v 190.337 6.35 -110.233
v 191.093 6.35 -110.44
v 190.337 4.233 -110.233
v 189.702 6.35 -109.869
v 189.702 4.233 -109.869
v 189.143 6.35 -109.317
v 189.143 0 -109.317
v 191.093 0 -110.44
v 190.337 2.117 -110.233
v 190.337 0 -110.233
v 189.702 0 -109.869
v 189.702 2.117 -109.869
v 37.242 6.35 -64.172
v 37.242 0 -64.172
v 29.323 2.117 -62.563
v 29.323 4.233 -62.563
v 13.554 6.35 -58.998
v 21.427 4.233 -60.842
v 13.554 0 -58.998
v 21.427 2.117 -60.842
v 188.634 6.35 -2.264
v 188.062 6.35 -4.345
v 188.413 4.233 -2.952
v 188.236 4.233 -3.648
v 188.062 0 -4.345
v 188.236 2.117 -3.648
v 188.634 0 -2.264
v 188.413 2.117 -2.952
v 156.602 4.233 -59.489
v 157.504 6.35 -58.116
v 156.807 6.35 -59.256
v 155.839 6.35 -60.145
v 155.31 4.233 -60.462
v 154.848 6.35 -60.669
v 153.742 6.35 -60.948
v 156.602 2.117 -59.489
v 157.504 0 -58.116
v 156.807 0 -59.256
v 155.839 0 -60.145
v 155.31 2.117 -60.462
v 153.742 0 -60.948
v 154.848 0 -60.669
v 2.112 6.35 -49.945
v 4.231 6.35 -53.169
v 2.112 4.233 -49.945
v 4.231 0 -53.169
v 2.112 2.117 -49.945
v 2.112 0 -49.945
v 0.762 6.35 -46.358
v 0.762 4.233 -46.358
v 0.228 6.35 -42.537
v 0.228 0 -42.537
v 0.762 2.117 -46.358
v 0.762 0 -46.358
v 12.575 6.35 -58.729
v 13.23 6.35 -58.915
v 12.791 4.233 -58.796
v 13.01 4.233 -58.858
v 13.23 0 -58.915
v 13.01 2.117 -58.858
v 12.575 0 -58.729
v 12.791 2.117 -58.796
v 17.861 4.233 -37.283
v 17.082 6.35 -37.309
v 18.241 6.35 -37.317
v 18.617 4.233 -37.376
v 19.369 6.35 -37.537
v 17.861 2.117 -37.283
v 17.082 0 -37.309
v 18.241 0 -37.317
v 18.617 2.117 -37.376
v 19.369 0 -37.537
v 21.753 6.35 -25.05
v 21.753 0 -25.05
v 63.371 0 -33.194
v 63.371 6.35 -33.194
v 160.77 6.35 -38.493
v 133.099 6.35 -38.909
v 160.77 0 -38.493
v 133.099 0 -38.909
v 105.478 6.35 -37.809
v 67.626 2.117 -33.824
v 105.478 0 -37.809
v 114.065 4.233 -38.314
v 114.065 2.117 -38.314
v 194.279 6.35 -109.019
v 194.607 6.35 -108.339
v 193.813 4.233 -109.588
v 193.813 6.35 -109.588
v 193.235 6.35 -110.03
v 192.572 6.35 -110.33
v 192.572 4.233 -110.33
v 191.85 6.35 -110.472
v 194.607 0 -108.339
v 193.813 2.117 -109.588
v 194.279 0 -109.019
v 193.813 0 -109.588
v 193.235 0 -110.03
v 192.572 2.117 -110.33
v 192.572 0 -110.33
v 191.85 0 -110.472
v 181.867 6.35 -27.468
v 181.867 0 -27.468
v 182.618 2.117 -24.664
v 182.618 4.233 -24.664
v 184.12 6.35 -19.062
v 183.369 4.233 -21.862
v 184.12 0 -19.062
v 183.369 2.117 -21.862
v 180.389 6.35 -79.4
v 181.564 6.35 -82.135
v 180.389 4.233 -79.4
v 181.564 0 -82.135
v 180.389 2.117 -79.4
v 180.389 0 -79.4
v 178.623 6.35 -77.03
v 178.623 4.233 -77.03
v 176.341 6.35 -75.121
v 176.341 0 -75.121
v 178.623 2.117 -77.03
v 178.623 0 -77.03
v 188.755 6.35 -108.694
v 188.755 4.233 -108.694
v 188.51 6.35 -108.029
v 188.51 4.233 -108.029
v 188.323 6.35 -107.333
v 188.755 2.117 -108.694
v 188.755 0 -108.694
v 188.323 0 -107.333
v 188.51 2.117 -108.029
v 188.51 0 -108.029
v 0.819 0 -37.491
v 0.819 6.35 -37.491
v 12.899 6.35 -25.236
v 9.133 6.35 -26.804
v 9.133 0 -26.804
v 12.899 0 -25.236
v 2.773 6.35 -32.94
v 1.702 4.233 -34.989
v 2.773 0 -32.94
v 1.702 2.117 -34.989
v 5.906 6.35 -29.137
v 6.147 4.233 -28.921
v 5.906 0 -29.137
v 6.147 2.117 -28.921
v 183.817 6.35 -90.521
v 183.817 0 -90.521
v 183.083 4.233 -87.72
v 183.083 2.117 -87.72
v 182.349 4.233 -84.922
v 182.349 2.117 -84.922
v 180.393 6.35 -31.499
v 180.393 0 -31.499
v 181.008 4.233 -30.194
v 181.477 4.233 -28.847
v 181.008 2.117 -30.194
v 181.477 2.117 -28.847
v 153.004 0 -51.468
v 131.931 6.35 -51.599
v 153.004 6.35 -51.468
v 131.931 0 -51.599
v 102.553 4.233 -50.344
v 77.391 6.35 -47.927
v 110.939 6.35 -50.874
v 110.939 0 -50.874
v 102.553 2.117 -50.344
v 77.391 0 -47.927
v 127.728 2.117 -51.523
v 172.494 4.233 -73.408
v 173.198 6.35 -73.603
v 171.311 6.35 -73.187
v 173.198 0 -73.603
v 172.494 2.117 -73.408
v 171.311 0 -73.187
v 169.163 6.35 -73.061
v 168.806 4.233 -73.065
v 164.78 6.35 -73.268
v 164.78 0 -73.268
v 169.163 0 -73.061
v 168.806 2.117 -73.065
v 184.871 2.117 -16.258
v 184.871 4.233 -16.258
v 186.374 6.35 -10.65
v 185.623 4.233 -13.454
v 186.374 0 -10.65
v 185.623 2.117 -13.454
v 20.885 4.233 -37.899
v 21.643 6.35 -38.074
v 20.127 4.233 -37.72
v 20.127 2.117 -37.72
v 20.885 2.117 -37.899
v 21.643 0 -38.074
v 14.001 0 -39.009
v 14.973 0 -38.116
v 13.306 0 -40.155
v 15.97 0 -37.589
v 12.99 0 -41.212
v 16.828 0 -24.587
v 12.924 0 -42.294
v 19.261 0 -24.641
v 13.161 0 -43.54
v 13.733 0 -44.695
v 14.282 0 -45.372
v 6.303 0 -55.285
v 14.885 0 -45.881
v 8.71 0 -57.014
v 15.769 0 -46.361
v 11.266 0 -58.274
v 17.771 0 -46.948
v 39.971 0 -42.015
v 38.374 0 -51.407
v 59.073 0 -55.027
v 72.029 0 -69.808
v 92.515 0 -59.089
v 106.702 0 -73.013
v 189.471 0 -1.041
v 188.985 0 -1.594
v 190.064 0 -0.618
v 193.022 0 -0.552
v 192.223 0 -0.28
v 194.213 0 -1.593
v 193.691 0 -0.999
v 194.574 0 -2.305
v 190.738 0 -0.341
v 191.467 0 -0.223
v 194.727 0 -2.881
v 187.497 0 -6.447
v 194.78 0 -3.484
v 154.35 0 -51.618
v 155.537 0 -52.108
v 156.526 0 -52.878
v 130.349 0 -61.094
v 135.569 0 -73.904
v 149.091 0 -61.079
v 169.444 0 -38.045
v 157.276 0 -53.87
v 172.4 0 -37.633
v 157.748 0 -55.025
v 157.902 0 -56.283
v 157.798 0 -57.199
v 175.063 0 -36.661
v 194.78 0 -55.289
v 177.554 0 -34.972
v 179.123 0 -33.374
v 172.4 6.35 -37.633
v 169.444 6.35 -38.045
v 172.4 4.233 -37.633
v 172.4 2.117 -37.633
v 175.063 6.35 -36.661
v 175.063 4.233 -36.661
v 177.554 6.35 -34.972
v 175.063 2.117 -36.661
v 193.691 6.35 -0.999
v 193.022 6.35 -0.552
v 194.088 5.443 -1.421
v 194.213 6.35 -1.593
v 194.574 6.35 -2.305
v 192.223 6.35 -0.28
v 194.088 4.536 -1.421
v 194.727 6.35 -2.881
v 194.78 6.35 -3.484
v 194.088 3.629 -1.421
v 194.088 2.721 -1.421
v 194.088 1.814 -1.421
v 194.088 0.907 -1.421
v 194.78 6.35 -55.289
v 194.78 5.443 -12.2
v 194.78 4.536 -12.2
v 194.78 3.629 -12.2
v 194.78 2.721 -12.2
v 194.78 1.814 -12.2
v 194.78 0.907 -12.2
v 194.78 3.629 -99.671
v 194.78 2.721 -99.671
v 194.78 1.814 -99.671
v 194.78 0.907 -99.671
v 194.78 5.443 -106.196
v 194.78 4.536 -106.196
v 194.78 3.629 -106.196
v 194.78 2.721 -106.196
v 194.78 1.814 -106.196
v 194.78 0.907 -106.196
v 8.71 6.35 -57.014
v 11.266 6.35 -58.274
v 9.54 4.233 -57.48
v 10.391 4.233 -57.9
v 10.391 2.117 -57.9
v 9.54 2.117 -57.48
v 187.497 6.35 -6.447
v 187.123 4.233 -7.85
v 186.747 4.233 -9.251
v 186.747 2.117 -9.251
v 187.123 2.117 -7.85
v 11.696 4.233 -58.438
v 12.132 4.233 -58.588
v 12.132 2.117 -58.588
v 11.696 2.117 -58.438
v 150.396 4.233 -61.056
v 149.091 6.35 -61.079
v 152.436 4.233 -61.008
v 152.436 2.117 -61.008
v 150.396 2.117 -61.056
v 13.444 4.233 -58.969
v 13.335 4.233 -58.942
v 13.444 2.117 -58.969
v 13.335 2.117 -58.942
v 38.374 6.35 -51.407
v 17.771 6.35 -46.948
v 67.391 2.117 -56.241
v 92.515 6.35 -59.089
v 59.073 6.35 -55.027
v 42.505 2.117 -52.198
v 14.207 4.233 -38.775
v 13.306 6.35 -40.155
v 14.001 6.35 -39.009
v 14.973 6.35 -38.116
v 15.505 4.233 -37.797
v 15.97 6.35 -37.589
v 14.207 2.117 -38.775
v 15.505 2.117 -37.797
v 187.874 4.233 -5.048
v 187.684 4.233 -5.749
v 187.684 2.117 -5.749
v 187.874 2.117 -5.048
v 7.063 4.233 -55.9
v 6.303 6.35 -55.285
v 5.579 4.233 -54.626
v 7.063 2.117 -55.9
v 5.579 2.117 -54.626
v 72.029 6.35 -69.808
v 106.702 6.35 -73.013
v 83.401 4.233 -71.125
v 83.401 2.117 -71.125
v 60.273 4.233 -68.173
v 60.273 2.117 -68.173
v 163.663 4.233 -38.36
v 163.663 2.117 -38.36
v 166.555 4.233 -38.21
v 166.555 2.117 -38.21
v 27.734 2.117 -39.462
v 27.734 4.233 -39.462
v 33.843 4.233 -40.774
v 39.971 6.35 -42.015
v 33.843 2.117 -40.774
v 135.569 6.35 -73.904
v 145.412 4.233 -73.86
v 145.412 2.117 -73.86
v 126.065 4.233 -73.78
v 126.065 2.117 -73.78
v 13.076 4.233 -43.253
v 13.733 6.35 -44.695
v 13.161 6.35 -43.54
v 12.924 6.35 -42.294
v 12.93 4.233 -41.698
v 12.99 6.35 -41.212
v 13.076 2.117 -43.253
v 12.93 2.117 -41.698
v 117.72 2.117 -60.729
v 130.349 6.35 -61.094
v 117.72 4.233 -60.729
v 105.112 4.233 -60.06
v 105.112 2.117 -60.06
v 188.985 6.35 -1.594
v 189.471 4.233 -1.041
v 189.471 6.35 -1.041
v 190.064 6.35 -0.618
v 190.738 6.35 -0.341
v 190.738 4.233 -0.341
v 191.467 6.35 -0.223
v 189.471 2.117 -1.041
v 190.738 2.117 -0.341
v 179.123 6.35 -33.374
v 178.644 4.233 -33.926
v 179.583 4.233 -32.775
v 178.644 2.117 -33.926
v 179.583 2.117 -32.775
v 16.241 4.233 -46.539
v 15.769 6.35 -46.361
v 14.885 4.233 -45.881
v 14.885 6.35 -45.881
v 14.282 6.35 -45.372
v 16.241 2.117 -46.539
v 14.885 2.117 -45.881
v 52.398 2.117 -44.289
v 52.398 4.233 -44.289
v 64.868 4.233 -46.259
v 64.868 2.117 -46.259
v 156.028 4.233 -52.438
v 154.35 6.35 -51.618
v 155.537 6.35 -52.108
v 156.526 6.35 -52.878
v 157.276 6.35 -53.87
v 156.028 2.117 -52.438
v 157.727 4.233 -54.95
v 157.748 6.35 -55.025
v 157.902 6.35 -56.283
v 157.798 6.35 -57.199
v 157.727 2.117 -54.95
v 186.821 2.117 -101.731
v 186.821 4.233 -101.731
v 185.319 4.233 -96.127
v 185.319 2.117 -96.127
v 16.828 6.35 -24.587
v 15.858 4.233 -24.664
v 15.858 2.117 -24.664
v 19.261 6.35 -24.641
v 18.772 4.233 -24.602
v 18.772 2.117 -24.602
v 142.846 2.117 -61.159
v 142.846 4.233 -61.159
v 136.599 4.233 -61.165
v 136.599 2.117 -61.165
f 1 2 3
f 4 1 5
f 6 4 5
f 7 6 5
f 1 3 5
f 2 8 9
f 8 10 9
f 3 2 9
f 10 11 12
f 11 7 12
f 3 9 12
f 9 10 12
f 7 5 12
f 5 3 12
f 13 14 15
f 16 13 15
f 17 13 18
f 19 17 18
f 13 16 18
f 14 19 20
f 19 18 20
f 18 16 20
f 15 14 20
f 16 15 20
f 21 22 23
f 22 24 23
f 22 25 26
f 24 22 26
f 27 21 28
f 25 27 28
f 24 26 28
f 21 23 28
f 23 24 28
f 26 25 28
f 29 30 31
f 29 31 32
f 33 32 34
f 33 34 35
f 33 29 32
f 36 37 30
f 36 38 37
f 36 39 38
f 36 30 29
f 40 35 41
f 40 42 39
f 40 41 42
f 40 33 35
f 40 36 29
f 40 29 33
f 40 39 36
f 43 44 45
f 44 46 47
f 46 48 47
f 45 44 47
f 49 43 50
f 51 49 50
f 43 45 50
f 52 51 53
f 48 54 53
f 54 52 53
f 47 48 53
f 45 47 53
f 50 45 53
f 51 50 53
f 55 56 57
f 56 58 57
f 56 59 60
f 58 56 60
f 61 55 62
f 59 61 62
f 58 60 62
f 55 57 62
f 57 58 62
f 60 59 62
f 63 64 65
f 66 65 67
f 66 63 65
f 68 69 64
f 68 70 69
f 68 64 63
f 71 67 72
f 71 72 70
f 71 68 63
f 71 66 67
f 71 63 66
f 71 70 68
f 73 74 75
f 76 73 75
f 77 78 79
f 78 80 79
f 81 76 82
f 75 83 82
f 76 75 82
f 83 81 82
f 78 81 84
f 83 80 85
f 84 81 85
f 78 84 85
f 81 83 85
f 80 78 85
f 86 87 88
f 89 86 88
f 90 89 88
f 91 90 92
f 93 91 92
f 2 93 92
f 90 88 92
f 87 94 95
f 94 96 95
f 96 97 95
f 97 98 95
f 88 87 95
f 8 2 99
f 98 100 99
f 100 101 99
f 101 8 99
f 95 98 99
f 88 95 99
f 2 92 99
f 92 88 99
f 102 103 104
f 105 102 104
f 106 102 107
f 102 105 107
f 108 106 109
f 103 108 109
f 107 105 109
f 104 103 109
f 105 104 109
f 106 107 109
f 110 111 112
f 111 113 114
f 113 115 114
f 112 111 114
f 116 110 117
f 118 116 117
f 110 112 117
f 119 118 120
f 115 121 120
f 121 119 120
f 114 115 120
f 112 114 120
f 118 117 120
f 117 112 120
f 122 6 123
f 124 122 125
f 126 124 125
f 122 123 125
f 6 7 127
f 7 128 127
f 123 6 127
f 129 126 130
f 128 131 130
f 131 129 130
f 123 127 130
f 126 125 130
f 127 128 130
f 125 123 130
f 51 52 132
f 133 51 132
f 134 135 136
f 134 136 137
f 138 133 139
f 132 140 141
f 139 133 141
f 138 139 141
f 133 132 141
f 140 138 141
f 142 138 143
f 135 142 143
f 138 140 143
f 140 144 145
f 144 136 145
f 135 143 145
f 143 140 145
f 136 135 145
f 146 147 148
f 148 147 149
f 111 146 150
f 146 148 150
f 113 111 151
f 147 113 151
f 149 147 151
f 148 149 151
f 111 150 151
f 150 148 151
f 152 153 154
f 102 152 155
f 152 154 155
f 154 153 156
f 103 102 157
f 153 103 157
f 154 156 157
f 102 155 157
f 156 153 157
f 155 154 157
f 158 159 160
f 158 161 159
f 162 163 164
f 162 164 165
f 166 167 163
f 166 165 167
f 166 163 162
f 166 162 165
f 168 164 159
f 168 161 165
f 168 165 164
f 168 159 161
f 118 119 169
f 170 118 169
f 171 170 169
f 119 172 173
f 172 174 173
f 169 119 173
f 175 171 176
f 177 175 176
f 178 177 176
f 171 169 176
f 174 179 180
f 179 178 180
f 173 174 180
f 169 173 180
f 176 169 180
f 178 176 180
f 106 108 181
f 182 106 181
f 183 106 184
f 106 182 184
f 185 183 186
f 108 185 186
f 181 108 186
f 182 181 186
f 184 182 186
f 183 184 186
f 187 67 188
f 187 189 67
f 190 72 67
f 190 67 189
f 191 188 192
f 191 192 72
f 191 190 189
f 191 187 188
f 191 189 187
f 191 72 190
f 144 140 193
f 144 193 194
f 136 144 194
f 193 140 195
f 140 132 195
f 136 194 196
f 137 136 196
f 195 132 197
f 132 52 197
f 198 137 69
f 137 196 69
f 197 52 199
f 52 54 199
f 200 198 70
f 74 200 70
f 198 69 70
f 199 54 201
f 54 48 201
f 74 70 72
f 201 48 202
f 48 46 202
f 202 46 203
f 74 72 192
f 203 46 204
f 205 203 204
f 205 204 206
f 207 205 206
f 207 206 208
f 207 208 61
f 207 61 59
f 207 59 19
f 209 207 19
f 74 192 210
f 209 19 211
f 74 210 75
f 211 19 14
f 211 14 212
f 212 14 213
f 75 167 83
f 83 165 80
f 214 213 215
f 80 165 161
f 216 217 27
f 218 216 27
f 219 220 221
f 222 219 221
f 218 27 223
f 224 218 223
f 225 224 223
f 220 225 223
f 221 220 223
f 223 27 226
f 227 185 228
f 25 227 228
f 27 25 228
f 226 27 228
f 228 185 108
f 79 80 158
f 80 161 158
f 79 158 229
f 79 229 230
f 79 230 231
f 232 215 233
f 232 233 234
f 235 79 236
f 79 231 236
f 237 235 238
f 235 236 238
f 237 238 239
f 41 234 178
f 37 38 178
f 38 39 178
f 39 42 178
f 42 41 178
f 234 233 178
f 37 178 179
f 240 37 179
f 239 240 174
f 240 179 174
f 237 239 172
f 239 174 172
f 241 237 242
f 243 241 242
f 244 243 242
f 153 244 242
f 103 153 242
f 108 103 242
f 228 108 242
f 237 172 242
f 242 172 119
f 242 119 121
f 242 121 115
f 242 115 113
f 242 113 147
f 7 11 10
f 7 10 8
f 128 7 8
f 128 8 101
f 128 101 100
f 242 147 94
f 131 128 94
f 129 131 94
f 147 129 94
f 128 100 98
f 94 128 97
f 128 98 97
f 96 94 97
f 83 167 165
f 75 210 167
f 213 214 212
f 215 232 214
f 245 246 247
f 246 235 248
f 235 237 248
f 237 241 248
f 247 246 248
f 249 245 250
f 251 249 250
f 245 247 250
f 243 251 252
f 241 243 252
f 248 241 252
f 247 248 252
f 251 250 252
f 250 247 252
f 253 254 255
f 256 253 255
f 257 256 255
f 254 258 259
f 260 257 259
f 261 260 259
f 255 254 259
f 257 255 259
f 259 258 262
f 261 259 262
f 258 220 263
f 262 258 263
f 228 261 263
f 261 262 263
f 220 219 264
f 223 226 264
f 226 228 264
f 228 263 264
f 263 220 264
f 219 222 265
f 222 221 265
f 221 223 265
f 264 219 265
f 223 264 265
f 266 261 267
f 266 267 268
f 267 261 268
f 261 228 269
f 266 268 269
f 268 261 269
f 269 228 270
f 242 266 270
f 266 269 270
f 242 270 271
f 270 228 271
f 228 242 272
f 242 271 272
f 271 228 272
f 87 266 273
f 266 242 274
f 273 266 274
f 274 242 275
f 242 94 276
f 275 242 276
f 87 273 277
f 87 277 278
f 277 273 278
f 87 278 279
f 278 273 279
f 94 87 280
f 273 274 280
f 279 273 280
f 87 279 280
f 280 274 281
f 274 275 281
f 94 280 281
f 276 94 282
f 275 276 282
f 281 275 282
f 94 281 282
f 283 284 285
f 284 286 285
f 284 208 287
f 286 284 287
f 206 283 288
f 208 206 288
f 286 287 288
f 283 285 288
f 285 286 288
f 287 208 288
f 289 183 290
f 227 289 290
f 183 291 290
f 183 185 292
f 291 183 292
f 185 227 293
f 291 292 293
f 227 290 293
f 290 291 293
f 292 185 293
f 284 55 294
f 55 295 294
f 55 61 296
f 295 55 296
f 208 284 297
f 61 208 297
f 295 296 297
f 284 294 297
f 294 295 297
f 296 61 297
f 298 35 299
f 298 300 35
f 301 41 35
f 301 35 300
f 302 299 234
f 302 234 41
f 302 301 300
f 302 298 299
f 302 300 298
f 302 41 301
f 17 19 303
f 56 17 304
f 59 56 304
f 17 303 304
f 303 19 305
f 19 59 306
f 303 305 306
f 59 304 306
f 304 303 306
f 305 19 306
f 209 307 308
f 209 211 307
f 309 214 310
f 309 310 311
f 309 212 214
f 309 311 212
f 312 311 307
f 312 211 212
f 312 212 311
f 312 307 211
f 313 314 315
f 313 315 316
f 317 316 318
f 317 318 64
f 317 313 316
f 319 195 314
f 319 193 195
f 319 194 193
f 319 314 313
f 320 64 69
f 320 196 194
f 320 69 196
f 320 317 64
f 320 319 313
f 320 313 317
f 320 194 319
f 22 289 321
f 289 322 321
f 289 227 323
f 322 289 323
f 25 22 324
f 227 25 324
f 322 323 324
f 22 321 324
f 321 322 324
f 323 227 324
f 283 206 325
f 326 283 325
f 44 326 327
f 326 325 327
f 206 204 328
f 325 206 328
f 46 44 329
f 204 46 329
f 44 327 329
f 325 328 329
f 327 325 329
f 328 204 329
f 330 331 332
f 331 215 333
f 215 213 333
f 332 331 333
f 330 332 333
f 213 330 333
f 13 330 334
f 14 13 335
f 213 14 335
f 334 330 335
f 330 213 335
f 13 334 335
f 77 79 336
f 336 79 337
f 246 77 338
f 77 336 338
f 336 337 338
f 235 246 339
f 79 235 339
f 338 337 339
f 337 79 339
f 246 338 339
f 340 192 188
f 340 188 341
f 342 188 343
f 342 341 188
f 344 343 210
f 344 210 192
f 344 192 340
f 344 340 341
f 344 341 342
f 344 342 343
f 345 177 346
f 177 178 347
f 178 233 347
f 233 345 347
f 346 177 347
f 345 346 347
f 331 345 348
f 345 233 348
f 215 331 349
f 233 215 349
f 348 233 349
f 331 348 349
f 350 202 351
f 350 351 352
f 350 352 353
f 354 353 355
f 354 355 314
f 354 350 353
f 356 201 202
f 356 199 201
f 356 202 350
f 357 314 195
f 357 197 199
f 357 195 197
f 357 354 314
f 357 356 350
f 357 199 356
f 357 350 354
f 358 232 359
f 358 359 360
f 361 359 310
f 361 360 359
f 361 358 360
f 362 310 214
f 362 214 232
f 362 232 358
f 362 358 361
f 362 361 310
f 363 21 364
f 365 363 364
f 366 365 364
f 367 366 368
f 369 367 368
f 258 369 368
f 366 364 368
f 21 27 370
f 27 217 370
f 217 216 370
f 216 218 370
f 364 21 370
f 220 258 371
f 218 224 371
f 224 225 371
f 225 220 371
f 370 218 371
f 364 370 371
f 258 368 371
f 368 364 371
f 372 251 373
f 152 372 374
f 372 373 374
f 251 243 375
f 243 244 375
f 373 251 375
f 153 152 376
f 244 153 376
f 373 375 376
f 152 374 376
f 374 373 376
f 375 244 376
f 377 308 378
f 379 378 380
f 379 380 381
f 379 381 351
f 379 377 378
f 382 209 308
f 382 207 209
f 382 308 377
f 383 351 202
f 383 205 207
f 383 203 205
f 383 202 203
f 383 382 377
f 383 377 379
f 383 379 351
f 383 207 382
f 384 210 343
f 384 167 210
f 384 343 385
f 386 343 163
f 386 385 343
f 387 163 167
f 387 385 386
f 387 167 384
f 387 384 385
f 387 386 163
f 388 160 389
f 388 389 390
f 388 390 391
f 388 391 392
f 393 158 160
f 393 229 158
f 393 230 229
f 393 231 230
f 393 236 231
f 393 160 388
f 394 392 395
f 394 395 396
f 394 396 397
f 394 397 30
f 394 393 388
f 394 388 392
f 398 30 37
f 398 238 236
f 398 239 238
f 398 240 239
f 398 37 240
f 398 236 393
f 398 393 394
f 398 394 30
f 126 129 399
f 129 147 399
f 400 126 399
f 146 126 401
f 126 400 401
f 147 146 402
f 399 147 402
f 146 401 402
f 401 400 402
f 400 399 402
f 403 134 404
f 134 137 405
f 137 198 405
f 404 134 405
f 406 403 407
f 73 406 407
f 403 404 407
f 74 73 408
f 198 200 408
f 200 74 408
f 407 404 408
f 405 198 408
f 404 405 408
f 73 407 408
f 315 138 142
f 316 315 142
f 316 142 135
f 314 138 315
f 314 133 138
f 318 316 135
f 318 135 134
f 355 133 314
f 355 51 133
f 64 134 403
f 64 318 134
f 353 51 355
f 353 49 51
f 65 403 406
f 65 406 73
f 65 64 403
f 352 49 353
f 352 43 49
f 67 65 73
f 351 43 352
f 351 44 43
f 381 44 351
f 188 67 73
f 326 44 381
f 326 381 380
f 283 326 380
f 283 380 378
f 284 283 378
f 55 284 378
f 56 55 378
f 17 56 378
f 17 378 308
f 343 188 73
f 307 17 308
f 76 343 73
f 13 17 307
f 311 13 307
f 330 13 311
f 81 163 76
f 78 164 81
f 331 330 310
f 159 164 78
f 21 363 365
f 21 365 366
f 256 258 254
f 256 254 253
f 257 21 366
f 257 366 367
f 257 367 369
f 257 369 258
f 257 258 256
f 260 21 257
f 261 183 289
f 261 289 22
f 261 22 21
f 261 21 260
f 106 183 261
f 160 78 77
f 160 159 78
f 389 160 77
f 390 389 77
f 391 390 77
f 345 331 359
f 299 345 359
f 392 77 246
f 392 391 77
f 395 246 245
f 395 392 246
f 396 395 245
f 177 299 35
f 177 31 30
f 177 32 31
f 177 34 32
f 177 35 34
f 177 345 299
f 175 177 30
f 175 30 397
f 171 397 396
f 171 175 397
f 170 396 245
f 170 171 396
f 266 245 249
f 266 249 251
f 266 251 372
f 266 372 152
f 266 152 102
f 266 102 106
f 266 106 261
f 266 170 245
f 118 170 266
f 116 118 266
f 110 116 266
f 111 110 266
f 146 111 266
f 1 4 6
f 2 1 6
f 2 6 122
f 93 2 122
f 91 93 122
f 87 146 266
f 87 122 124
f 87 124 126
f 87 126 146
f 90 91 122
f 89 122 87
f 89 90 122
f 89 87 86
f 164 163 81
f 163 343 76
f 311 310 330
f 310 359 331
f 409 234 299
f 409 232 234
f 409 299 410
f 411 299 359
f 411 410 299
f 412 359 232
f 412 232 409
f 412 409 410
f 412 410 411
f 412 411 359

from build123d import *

# Parameters (mm, degrees)
BOSS_EXTRUDE1_DEPTH = 6.35


with BuildPart() as part:
    # Imported Profile → Boss-Extrude1 (new body)
    with BuildSketch(Plane(origin=(0, 0, 0), x_dir=(1, 0, 0), z_dir=(0, 1, 0))):
        with BuildLine():
            add(Edge.make_bspline(
                [(12.8991106, 25.2359922), (15.9171132, 24.409273), (18.70075, 24.3472716), (21.7531188, 25.0501404)],
                knots=[0, 0, 0, 0, 1, 1, 1, 1], degree=3))
            add(Edge.make_bspline(
                [(21.7531188, 25.0501404), (67.2421566, 35.9573322), (114.0334524, 40.4772876), (160.7696048, 38.492938)],
                knots=[0, 0, 0, 0, 1, 1, 1, 1], degree=3))
            add(Edge.make_bspline(
                [(160.7696048, 38.492938), (163.6634776, 38.3689352), (166.5573758, 38.2174242), (169.4443652, 38.0449328)],
                knots=[0, 0, 0, 0, 1, 1, 1, 1], degree=3))
            add(Edge.make_bspline(
                [(169.4443652, 38.0449328), (172.5862944, 37.8589286), (175.108108, 37.0734336), (177.5541026, 34.9719392)],
                knots=[0, 0, 0, 0, 1, 1, 1, 1], degree=3))
            add(Edge.make_bspline(
                [(177.5541026, 34.9719392), (178.725449, 33.9728302), (179.6418556, 32.842835), (180.3928574, 31.4992766)],
                knots=[0, 0, 0, 0, 1, 1, 1, 1], degree=3))
            add(Edge.make_bspline(
                [(180.3928574, 31.4992766), (181.1025588, 30.2176688), (181.4952936, 28.8603182), (181.8673782, 27.4684744)],
                knots=[0, 0, 0, 0, 1, 1, 1, 1], degree=3))
            add(Edge.make_bspline(
                [(181.8673782, 27.4684744), (182.6184054, 24.6641874), (183.3694326, 21.859875), (184.1204598, 19.0624714)],
                knots=[0, 0, 0, 0, 1, 1, 1, 1], degree=3))
            add(Edge.make_bspline(
                [(184.1204598, 19.0624714), (184.871487, 16.2581844), (185.6225142, 13.453872), (186.3735414, 10.6495342)],
                knots=[0, 0, 0, 0, 1, 1, 1, 1], degree=3))
            add(Edge.make_bspline(
                [(186.3735414, 10.6495342), (186.7456514, 9.2508324), (187.1245686, 7.8521306), (187.4966532, 6.44652)],
                knots=[0, 0, 0, 0, 1, 1, 1, 1], degree=3))
            add(Edge.make_bspline(
                [(187.4966532, 6.44652), (187.6827082, 5.7506362), (187.8755958, 5.0478182), (188.0616508, 4.3450256)],
                knots=[0, 0, 0, 0, 1, 1, 1, 1], degree=3))
            add(Edge.make_bspline(
                [(188.0616508, 4.3450256), (188.2477058, 3.649091), (188.378592, 2.9463238), (188.6335318, 2.2641814)],
                knots=[0, 0, 0, 0, 1, 1, 1, 1], degree=3))
            add(Edge.make_bspline(
                [(188.6335318, 2.2641814), (189.1847372, 0.8172196), (190.7005838, -0.0164592), (192.2233138, 0.2798318)],
                knots=[0, 0, 0, 0, 1, 1, 1, 1], degree=3))
            add(Edge.make_bspline(
                [(192.2233138, 0.2798318), (193.787395, 0.5968238), (194.7795952, 1.9334734), (194.7795952, 3.4975292)],
                knots=[0, 0, 0, 0, 1, 1, 1, 1], degree=3))
            add(Edge.make_bspline(
                [(194.7795952, 3.4975292), (194.7795952, 6.3982854), (194.7795952, 9.2990924), (194.7795952, 12.1998232)],
                knots=[0, 0, 0, 0, 1, 1, 1, 1], degree=3))
            add(Edge.make_bspline(
                [(194.7795952, 12.1998232), (194.7795952, 35.5506782), (194.7795952, 58.908442), (194.7795952, 82.2592716)],
                knots=[0, 0, 0, 0, 1, 1, 1, 1], degree=3))
            add(Edge.make_bspline(
                [(194.7795952, 82.2592716), (194.7795952, 88.0608348), (194.7795952, 93.8623726), (194.7795952, 99.6708192)],
                knots=[0, 0, 0, 0, 1, 1, 1, 1], degree=3))
            add(Edge.make_bspline(
                [(194.7795952, 99.6708192), (194.7795952, 101.117781), (194.7795952, 102.5715754), (194.7795952, 104.0185372)],
                knots=[0, 0, 0, 0, 1, 1, 1, 1], degree=3))
            add(Edge.make_bspline(
                [(194.7795952, 104.0185372), (194.7795952, 104.74198), (194.7795952, 105.4723824), (194.7795952, 106.1958252)],
                knots=[0, 0, 0, 0, 1, 1, 1, 1], degree=3))
            add(Edge.make_bspline(
                [(194.7795952, 106.1958252), (194.7795952, 106.919268), (194.8485308, 107.6151772), (194.6072308, 108.3386708)],
                knots=[0, 0, 0, 0, 1, 1, 1, 1], degree=3))
            add(Edge.make_bspline(
                [(194.6072308, 108.3386708), (194.10426, 109.799374), (192.6228558, 110.6882216), (191.0932424, 110.4401906)],
                knots=[0, 0, 0, 0, 1, 1, 1, 1], degree=3))
            add(Edge.make_bspline(
                [(191.0932424, 110.4401906), (190.2595382, 110.302675), (189.6807484, 109.9716876), (189.1433352, 109.3170788)],
                knots=[0, 0, 0, 0, 1, 1, 1, 1], degree=3))
            add(Edge.make_bspline(
                [(189.1433352, 109.3170788), (188.6541312, 108.7176388), (188.5094274, 108.0423798), (188.3233724, 107.3326784)],
                knots=[0, 0, 0, 0, 1, 1, 1, 1], degree=3))
            add(Edge.make_bspline(
                [(188.3233724, 107.3326784), (186.821318, 101.7309878), (185.3192636, 96.129221), (183.8172092, 90.5206216)],
                knots=[0, 0, 0, 0, 1, 1, 1, 1], degree=3))
            add(Edge.make_bspline(
                [(183.8172092, 90.5206216), (183.0661566, 87.723218), (182.390923, 84.9120222), (181.5641022, 82.1352688)],
                knots=[0, 0, 0, 0, 1, 1, 1, 1], degree=3))
            add(Edge.make_bspline(
                [(181.5641022, 82.1352688), (180.7097224, 79.2482794), (178.8562844, 76.7678424), (176.3413288, 75.1210334)],
                knots=[0, 0, 0, 0, 1, 1, 1, 1], degree=3))
            add(Edge.make_bspline(
                [(176.3413288, 75.1210334), (172.248576, 72.4476834), (169.1410892, 73.0677736), (164.7796044, 73.26757)],
                knots=[0, 0, 0, 0, 1, 1, 1, 1], degree=3))
            add(Edge.make_bspline(
                [(164.7796044, 73.26757), (145.390616, 74.1908854), (126.0842792, 74.128884), (106.7021742, 73.0125794)],
                knots=[0, 0, 0, 0, 1, 1, 1, 1], degree=3))
            add(Edge.make_bspline(
                [(106.7021742, 73.0125794), (83.2893178, 71.6620868), (60.2485206, 68.6924204), (37.2421658, 64.1724396)],
                knots=[0, 0, 0, 0, 1, 1, 1, 1], degree=3))
            add(Edge.make_bspline(
                [(37.2421658, 64.1724396), (29.3115492, 62.6152926), (21.4154004, 60.9064822), (13.553694, 58.9979262)],
                knots=[0, 0, 0, 0, 1, 1, 1, 1], degree=3))
            add(Edge.make_bspline(
                [(13.553694, 58.9979262), (13.4434326, 58.9679288), (13.3331966, 58.9429352), (13.229844, 58.915427)],
                knots=[0, 0, 0, 0, 1, 1, 1, 1], degree=3))
            add(Edge.make_bspline(
                [(13.229844, 58.915427), (13.0093466, 58.860436), (12.7889, 58.7984346), (12.575286, 58.7294228)],
                knots=[0, 0, 0, 0, 1, 1, 1, 1], degree=3))
            add(Edge.make_bspline(
                [(12.575286, 58.7294228), (12.1274332, 58.5914246), (11.6933218, 58.446924), (11.2661446, 58.2744326)],
                knots=[0, 0, 0, 0, 1, 1, 1, 1], degree=3))
            add(Edge.make_bspline(
                [(11.2661446, 58.2744326), (10.377297, 57.922922), (9.5298006, 57.5027298), (8.7098886, 57.0135258)],
                knots=[0, 0, 0, 0, 1, 1, 1, 1], degree=3))
            add(Edge.make_bspline(
                [(8.7098886, 57.0135258), (6.9735446, 55.9731418), (5.5197248, 54.7259764), (4.231259, 53.1688294)],
                knots=[0, 0, 0, 0, 1, 1, 1, 1], degree=3))
            add(Edge.make_bspline(
                [(4.231259, 53.1688294), (1.7438878, 50.1715786), (0.3383026, 46.4302348), (0.2280666, 42.5372784)],
                knots=[0, 0, 0, 0, 1, 1, 1, 1], degree=3))
            add(Edge.make_bspline(
                [(0.2280666, 42.5372784), (-0.0061976, 34.5515184), (5.2165504, 27.4270724), (12.8991106, 25.2359922)],
                knots=[0, 0, 0, 0, 1, 1, 1, 1], degree=3))
        make_face()
        with BuildLine():
            add(Edge.make_bspline(
                [(153.0043676, 51.4684772), (156.490797, 51.3705856), (158.8885824, 54.9190926), (157.5036474, 58.1161398)],
                knots=[0, 0, 0, 0, 1, 1, 1, 1], degree=3))
            add(Edge.make_bspline(
                [(157.5036474, 58.1161398), (156.8352972, 59.65952), (155.4090364, 60.7343718), (153.7416026, 60.9479858)],
                knots=[0, 0, 0, 0, 1, 1, 1, 1], degree=3))
            add(Edge.make_bspline(
                [(153.7416026, 60.9479858), (153.2937498, 61.0099872), (149.5385884, 61.0719886), (149.0907356, 61.0789736)],
                knots=[0, 0, 0, 0, 1, 1, 1, 1], degree=3))
            add(Edge.make_bspline(
                [(149.0907356, 61.0789736), (142.848203, 61.1959914), (136.5988124, 61.2029764), (130.3494218, 61.093985)],
                knots=[0, 0, 0, 0, 1, 1, 1, 1], degree=3))
            add(Edge.make_bspline(
                [(130.3494218, 61.093985), (117.7059114, 60.8804726), (105.1106356, 60.2120208), (92.5153598, 59.0889344)],
                knots=[0, 0, 0, 0, 1, 1, 1, 1], degree=3))
            add(Edge.make_bspline(
                [(92.5153598, 59.0889344), (67.2421566, 56.8358274), (42.458132, 52.805076), (17.7705766, 46.9484202)],
                knots=[0, 0, 0, 0, 1, 1, 1, 1], degree=3))
            add(Edge.make_bspline(
                [(17.7705766, 46.9484202), (16.1651696, 46.5694268), (14.7733512, 46.2387188), (13.7329418, 44.6953386)],
                knots=[0, 0, 0, 0, 1, 1, 1, 1], degree=3))
            add(Edge.make_bspline(
                [(13.7329418, 44.6953386), (12.8234186, 43.3517294), (12.664948, 41.6498786), (13.3057392, 40.1546822)],
                knots=[0, 0, 0, 0, 1, 1, 1, 1], degree=3))
            add(Edge.make_bspline(
                [(13.3057392, 40.1546822), (13.9671806, 38.6043678), (15.4072336, 37.5226326), (17.0815508, 37.3090186)],
                knots=[0, 0, 0, 0, 1, 1, 1, 1], degree=3))
            add(Edge.make_bspline(
                [(17.0815508, 37.3090186), (17.8808126, 37.205539), (18.6111896, 37.3590312), (19.3691002, 37.5365264)],
                knots=[0, 0, 0, 0, 1, 1, 1, 1], degree=3))
            add(Edge.make_bspline(
                [(19.3691002, 37.5365264), (20.1270108, 37.7225306), (20.8849468, 37.9015244), (21.6428574, 38.0739904)],
                knots=[0, 0, 0, 0, 1, 1, 1, 1], degree=3))
            add(Edge.make_bspline(
                [(21.6428574, 38.0739904), (27.726894, 39.5002258), (33.8316062, 40.8093926), (39.9707608, 42.0151306)],
                knots=[0, 0, 0, 0, 1, 1, 1, 1], degree=3))
            add(Edge.make_bspline(
                [(39.9707608, 42.0151306), (52.380007, 44.440475), (64.8374624, 46.4110832), (77.3914124, 47.9269298)],
                knots=[0, 0, 0, 0, 1, 1, 1, 1], degree=3))
            add(Edge.make_bspline(
                [(77.3914124, 47.9269298), (102.5750552, 50.965481), (127.648462, 52.1368274), (153.0043676, 51.4684772)],
                knots=[0, 0, 0, 0, 1, 1, 1, 1], degree=3))
        make_face(mode=Mode.SUBTRACT)
    extrude(amount=BOSS_EXTRUDE1_DEPTH)


solid = part.part
